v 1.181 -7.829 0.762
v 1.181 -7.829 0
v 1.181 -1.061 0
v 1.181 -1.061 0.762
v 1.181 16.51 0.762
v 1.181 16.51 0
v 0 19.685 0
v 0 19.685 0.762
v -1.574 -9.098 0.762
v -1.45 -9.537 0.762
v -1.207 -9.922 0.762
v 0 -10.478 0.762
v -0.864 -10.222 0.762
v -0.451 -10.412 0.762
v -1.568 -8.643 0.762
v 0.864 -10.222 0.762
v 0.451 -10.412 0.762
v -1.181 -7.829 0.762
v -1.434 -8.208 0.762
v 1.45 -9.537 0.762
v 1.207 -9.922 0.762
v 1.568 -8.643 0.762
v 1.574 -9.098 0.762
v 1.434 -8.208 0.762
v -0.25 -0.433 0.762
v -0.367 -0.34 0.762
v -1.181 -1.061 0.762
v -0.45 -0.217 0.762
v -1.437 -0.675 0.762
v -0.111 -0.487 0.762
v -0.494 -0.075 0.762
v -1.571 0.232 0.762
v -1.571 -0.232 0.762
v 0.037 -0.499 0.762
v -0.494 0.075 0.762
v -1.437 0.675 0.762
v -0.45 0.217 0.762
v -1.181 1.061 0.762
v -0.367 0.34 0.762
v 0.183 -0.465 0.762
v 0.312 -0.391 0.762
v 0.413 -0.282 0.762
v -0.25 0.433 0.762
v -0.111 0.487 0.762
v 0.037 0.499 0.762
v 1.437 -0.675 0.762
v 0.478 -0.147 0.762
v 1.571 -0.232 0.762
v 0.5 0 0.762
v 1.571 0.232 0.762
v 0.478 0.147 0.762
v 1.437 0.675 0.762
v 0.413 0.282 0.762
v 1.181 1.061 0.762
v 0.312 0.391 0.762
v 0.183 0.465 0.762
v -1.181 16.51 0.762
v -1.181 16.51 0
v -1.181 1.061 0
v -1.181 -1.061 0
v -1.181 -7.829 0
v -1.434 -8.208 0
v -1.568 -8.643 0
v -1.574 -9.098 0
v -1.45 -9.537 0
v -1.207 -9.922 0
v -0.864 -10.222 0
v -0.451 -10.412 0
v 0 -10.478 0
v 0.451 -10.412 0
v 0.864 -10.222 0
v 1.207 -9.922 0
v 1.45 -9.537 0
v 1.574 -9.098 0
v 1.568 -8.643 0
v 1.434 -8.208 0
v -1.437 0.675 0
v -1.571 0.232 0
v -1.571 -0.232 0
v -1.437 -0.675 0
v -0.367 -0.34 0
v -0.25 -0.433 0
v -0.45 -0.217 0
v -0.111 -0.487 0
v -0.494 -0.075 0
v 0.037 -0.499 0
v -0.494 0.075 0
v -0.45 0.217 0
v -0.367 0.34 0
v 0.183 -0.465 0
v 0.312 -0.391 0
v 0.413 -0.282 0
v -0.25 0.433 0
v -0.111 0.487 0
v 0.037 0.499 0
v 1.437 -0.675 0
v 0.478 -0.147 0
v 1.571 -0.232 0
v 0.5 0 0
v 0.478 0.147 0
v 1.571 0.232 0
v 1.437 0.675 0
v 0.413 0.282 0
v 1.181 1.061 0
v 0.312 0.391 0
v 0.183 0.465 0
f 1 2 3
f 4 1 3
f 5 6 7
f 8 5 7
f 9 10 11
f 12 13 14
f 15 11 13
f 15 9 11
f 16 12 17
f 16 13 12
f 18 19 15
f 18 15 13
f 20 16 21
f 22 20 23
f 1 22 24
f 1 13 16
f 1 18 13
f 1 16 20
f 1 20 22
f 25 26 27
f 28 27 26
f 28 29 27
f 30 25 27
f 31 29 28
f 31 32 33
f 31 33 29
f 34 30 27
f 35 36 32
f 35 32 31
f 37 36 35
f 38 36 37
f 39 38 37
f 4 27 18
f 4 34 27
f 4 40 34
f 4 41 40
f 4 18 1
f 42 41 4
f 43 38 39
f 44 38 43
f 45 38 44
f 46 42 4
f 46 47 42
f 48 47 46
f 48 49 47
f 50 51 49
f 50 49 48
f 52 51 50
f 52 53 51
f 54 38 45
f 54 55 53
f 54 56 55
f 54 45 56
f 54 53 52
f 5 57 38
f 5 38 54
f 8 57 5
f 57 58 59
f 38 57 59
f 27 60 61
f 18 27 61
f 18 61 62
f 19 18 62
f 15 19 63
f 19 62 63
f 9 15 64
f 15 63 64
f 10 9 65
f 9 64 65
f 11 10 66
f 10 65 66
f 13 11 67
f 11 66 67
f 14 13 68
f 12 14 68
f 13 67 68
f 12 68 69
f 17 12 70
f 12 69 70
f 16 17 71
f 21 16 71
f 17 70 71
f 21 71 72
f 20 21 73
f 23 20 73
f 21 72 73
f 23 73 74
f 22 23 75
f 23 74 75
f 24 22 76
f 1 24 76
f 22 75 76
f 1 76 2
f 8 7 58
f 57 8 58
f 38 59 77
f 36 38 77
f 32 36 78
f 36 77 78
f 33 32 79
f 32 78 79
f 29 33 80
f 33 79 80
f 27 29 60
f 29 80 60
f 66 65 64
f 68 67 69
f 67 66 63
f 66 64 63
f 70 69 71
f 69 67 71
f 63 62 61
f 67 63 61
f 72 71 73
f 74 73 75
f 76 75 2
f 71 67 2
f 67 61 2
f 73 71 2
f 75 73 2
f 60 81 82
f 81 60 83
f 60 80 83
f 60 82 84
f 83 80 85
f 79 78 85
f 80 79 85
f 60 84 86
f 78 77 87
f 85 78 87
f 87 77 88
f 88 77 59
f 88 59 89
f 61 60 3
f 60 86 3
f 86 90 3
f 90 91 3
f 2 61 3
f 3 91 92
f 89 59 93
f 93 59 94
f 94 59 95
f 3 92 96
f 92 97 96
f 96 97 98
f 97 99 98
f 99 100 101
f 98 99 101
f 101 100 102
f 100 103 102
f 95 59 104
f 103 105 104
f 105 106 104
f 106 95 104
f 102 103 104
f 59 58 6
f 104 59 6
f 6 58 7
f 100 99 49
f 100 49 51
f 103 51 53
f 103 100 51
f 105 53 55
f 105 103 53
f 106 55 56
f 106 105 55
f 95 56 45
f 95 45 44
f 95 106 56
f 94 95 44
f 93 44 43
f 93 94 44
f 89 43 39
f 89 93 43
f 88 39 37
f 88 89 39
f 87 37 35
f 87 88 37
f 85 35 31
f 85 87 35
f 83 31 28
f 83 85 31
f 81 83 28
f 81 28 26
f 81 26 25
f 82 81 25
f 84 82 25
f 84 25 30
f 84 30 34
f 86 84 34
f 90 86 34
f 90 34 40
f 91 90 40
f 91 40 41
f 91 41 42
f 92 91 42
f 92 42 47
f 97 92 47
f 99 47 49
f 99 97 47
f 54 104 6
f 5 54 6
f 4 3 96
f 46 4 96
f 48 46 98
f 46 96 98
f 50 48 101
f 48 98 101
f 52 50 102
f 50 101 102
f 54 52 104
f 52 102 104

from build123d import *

# Parameters (mm, degrees)
SKETCH1_R           = 0.5
BOSS_EXTRUDE1_DEPTH = 0.762


with BuildPart() as part:
    # Sketch1 → Boss-Extrude1 (new body)
    with BuildSketch(Plane.XY):
        with BuildLine():
            Line((-1.1811, -1.060735141), (-1.1811, -7.829264859))
            ThreePointArc((-1.1811, -7.829264859), (0, -10.4775), (1.1811, -7.829264859))
            Line((1.1811, -7.829264859), (1.1811, -1.060735141))
            ThreePointArc((1.1811, -1.060735141), (1.5875, 0), (1.1811, 1.060735141))
            Line((1.1811, 1.060735141), (1.1811, 16.51))
            Line((1.1811, 16.51), (0, 19.685))
            Line((0, 19.685), (-1.1811, 16.51))
            Line((-1.1811, 16.51), (-1.1811, 1.060735141))
            ThreePointArc((-1.1811, 1.060735141), (-1.5875, 0), (-1.1811, -1.060735141))
        make_face()
        Circle(SKETCH1_R, mode=Mode.SUBTRACT)
    extrude(amount=BOSS_EXTRUDE1_DEPTH)


solid = part.part
